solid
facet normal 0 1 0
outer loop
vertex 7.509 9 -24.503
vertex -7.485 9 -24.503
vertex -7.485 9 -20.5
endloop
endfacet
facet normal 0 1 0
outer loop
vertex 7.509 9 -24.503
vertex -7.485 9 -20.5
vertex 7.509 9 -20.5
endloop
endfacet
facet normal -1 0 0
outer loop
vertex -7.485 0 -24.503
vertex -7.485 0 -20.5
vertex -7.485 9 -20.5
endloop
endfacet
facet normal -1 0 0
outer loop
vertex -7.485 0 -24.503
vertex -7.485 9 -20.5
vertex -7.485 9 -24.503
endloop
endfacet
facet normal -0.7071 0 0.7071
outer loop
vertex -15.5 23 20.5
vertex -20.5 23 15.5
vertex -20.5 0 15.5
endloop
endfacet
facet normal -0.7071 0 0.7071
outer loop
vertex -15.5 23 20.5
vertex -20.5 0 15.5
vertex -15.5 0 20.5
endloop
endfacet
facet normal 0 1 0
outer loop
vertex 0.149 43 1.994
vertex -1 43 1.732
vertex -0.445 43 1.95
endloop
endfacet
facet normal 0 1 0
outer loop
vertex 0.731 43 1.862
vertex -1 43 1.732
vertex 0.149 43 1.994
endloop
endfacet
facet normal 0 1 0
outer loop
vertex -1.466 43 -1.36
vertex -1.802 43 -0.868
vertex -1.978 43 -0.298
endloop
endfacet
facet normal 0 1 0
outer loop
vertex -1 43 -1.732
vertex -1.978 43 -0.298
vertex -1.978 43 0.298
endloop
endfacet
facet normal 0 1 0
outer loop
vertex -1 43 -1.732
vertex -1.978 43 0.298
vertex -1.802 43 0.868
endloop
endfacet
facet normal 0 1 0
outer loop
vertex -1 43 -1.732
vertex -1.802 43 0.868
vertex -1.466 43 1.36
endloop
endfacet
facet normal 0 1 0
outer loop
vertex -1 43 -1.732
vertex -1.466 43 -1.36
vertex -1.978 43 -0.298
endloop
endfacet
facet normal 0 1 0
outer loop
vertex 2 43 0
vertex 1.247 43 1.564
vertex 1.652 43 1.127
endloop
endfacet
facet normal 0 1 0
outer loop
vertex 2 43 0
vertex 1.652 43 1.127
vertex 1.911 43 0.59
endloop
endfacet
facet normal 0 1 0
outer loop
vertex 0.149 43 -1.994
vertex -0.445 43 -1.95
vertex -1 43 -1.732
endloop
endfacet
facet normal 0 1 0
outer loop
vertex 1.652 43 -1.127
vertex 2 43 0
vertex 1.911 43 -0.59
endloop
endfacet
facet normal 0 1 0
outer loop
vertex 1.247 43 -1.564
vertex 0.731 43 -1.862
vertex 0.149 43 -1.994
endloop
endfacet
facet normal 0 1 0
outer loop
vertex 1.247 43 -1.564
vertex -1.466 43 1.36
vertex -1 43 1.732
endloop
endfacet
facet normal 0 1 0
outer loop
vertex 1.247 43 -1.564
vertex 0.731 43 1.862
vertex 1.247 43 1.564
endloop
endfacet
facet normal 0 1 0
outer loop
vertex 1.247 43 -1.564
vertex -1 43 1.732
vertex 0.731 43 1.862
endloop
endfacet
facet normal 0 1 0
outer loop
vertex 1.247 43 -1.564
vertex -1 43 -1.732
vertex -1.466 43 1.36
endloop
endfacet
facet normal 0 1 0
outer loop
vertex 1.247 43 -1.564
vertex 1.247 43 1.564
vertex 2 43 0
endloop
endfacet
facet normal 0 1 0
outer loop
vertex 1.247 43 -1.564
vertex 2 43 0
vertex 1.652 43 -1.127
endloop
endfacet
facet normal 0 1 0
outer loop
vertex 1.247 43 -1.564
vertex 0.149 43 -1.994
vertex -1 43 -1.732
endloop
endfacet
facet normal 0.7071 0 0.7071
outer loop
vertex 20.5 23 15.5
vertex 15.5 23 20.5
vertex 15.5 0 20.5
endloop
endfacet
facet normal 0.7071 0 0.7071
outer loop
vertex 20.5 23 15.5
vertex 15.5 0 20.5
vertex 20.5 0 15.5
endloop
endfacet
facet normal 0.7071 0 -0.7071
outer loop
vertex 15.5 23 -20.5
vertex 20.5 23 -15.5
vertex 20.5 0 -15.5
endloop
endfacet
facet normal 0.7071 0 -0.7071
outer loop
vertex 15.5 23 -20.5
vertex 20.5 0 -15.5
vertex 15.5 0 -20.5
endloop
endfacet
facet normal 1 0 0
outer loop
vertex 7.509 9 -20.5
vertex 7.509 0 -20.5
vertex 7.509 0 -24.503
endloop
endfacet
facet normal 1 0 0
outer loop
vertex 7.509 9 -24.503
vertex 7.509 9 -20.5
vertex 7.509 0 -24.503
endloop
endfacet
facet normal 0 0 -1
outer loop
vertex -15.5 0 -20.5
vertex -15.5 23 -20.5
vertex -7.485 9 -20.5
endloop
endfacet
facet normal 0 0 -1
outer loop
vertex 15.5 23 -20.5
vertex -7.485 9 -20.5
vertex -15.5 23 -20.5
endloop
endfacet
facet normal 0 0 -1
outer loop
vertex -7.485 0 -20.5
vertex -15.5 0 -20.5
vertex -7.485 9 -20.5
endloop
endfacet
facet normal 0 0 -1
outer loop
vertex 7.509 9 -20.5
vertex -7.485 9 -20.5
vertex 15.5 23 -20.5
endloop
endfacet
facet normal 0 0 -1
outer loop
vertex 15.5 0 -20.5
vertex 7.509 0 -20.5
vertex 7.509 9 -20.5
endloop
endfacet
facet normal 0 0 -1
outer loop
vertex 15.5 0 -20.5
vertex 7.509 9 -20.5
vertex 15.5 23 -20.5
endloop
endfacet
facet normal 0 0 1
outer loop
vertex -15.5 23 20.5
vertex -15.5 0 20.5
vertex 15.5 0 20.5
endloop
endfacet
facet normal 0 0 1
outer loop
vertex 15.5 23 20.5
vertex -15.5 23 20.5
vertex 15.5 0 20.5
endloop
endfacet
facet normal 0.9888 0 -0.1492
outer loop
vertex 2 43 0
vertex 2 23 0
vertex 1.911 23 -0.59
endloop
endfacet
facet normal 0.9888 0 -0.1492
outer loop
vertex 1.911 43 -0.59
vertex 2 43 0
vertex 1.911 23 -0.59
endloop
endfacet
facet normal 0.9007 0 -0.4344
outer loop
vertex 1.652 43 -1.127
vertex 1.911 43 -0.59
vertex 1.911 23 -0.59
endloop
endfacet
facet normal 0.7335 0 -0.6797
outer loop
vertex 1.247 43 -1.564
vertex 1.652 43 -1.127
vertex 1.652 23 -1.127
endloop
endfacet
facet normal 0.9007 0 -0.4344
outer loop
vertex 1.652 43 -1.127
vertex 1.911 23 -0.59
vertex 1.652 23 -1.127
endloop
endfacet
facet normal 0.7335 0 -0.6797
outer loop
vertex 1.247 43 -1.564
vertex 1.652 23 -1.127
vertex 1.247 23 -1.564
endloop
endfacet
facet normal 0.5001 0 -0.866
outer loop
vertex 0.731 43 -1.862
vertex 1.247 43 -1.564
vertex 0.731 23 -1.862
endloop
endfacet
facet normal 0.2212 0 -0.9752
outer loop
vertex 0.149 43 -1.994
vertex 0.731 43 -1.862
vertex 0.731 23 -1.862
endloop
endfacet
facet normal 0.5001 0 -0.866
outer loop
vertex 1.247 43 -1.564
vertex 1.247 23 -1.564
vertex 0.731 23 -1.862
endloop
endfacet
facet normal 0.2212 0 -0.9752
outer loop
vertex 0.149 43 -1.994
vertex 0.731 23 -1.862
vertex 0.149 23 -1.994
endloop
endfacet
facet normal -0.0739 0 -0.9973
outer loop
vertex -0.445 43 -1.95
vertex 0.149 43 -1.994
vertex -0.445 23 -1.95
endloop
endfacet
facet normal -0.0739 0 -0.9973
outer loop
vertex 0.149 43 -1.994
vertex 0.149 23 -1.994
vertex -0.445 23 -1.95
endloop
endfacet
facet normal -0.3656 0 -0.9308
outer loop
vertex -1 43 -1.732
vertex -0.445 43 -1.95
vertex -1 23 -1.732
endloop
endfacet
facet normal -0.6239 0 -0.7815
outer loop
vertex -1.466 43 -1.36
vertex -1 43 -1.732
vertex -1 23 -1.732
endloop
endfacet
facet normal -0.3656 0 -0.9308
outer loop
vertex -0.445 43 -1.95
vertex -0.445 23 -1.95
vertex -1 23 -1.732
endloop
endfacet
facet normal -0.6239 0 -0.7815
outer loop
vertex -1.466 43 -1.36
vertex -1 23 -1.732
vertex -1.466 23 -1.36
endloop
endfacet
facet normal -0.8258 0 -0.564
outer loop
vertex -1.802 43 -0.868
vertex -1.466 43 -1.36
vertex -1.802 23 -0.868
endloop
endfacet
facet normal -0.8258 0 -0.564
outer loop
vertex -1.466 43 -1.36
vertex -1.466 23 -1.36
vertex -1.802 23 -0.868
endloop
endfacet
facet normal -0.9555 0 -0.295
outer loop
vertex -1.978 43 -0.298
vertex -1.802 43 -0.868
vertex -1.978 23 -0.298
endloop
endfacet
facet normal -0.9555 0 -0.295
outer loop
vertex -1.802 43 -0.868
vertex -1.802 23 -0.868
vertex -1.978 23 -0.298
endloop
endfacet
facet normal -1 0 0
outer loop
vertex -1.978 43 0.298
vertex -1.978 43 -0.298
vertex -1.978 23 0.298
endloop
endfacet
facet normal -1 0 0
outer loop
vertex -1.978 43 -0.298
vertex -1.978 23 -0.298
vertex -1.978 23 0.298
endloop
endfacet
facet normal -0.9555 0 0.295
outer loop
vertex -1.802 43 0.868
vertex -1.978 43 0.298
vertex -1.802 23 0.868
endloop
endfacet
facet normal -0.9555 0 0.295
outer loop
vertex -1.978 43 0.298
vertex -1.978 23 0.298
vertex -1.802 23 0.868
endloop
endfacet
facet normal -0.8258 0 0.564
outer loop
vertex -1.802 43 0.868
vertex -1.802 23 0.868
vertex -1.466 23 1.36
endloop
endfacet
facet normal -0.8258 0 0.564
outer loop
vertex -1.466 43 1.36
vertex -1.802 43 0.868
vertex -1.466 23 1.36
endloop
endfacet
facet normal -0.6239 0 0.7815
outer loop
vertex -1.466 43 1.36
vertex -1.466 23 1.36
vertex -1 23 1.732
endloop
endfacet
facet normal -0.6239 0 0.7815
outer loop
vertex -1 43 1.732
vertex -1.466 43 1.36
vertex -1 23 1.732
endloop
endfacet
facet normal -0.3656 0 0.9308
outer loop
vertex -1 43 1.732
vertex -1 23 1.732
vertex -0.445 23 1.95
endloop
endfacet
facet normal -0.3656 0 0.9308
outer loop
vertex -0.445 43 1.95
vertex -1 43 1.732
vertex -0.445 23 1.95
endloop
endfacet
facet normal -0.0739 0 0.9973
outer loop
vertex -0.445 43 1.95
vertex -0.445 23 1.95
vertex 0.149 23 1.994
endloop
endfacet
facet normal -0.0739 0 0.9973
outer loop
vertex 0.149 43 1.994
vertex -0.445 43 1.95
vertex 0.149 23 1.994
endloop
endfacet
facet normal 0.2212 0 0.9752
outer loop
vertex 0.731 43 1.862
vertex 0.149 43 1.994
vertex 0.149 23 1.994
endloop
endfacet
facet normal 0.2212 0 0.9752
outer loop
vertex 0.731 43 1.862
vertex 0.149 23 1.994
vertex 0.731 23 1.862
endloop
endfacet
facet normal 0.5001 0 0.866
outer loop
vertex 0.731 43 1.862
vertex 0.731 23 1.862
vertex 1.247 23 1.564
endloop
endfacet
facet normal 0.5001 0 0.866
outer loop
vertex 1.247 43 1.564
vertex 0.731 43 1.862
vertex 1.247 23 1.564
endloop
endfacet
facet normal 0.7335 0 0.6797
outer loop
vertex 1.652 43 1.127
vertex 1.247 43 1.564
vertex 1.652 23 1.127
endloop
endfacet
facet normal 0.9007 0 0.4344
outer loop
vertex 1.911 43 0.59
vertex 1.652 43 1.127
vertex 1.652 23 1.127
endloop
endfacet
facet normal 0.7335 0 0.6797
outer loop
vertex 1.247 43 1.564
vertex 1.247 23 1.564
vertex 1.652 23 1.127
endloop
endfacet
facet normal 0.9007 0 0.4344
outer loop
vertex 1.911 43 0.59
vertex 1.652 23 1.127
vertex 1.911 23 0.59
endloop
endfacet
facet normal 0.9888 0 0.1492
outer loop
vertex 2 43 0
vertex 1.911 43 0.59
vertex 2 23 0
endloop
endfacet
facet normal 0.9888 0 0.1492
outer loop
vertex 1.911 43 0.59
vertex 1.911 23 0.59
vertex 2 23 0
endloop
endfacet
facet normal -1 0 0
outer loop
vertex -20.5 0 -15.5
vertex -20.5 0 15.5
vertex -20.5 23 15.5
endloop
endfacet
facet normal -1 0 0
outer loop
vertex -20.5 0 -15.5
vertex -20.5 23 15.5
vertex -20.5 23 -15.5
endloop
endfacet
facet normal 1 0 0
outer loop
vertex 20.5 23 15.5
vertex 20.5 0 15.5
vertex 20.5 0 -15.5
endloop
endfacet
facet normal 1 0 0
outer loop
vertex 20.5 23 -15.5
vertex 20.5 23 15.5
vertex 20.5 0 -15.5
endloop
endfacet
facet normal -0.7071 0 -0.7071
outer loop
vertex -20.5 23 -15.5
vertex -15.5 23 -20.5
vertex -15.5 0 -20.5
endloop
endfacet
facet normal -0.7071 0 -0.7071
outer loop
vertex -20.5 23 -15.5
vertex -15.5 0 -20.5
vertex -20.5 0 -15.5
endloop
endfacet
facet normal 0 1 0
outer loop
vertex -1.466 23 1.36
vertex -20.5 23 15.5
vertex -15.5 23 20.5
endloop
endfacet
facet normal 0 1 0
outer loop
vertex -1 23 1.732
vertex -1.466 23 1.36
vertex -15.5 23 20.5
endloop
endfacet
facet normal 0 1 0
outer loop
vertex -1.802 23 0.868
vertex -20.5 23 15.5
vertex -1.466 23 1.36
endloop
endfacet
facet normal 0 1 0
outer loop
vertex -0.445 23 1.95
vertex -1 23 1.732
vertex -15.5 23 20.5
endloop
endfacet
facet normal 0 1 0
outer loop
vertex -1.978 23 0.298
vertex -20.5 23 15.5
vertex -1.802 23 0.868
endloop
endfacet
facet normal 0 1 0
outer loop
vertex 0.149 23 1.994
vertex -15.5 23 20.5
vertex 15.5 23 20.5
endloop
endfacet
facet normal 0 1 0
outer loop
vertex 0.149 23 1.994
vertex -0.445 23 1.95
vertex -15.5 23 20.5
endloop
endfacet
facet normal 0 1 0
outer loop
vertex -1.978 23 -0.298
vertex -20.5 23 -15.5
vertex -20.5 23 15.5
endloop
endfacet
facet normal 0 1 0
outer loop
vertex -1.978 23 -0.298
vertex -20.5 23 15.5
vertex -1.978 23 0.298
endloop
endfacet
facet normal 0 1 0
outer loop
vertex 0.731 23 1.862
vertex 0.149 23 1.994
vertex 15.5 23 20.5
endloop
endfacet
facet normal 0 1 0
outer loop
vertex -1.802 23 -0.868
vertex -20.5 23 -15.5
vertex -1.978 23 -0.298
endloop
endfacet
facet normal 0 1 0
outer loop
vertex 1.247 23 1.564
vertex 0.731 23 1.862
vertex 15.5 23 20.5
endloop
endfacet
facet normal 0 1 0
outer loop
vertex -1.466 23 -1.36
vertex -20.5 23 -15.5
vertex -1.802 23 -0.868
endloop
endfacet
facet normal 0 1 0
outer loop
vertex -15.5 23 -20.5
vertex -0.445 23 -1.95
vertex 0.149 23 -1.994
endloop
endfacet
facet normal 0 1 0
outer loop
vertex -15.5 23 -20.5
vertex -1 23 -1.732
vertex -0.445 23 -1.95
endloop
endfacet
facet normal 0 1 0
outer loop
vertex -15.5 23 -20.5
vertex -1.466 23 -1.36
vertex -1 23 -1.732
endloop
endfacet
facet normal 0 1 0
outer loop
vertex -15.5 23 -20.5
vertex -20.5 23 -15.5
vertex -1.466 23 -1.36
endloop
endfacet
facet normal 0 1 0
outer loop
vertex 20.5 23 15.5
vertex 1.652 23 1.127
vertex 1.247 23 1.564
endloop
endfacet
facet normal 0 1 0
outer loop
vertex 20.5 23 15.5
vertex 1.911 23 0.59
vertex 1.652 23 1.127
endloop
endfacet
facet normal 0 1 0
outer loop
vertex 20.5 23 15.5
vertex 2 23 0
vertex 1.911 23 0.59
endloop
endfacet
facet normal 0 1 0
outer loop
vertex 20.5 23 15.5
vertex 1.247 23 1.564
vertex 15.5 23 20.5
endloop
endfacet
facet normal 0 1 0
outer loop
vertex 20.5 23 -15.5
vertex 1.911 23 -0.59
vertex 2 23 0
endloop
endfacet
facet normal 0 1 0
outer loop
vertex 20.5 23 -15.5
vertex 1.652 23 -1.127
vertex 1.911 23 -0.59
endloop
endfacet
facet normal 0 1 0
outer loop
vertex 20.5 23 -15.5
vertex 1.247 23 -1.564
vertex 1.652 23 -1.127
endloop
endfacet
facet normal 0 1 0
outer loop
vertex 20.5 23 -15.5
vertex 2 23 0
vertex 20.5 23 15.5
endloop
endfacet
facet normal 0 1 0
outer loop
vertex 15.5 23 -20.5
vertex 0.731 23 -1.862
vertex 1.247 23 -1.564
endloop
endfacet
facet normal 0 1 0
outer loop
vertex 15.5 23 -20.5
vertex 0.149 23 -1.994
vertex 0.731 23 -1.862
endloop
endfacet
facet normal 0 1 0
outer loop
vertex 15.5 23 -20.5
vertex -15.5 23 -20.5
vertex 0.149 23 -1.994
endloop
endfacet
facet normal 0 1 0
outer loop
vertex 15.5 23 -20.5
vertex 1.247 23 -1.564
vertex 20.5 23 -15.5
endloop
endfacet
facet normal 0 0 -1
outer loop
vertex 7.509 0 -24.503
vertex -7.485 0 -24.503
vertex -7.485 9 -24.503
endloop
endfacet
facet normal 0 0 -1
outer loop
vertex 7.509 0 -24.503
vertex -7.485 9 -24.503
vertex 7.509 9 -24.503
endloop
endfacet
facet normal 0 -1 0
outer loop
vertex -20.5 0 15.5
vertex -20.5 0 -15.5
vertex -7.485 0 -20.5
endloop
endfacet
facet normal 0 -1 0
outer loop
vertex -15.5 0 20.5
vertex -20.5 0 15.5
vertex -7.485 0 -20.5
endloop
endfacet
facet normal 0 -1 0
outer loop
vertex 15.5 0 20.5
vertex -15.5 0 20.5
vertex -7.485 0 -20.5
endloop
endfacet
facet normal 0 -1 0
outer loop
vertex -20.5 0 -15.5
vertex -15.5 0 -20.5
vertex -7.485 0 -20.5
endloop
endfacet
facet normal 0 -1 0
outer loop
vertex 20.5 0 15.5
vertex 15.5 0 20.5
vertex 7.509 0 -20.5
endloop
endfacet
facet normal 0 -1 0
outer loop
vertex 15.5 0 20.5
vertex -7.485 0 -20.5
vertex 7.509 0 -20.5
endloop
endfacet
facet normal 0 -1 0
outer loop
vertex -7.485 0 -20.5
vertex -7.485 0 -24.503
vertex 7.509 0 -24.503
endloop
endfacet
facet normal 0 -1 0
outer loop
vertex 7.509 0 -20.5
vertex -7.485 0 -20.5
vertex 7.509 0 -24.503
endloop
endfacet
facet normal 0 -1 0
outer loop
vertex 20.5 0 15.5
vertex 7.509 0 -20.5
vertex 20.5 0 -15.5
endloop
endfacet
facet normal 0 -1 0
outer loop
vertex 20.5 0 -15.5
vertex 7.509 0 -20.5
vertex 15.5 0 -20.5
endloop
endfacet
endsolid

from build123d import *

# Parameters (mm, degrees)
SKETCH2_W            = 41
SKETCH2_H            = 41
SKETCH2_W_2          = 14.993938253
SKETCH2_H_2          = 4.00275912
BOSS_EXTRUDE7_DEPTH  = 23
CUT_EXTRUDE1_DEPTH   = 23
CUT_EXTRUDE3_DEPTH   = 23
SKETCH8_W            = 14.993938253
SKETCH8_H            = 4.00275912
CUT_EXTRUDE4_DEPTH   = 14
SKETCH3_R            = 2
BOSS_EXTRUDE11_DEPTH = 20


with BuildPart() as part:
    # Sketch2 → Boss-Extrude7 (new body)
    with BuildSketch(Plane(origin=(0, 0, 0), x_dir=(1, 0, 0), z_dir=(0, 1, 0))):
        Rectangle(SKETCH2_W, SKETCH2_H)
        with Locations((0.012281963, 22.50137956)):
            Rectangle(SKETCH2_W_2, SKETCH2_H_2)
    extrude(amount=BOSS_EXTRUDE7_DEPTH)

    # Sketch6 → Cut-Extrude1 (cut)
    with BuildSketch(Plane(origin=(0, 0, 0), x_dir=(1, 0, 0), z_dir=(0, 1, 0))):
        Polygon((-20.5, 20.5), (-15.5, 20.5), (-20.5, 15.5), align=None)
    extrude(amount=CUT_EXTRUDE1_DEPTH, mode=Mode.SUBTRACT)

    # Sketch7 → Cut-Extrude3 (cut)
    with BuildSketch(Plane(origin=(0, 0, 0), x_dir=(1, 0, 0), z_dir=(0, 1, 0))):
        Polygon((-20.5, -20.5), (-20.5, -15.5), (-15.5, -20.5), align=None)
        Polygon((20.5, -20.5), (15.5, -20.5), (20.5, -15.5), align=None)
        Polygon((20.5, 20.5), (20.5, 15.5), (15.5, 20.5), align=None)
    extrude(amount=CUT_EXTRUDE3_DEPTH, mode=Mode.SUBTRACT)

    # Sketch8 → Cut-Extrude4 (cut)
    with BuildSketch(Plane(origin=(0, 23, 0), x_dir=(1, 0, 0), z_dir=(0, 1, 0))):
        with Locations((0.012281963, 22.50137956)):
            Rectangle(SKETCH8_W, SKETCH8_H)
    extrude(amount=-CUT_EXTRUDE4_DEPTH, mode=Mode.SUBTRACT)

    # Sketch3 → Boss-Extrude11 (add)
    with BuildSketch(Plane(origin=(0, 23, 0), x_dir=(1, 0, 0), z_dir=(0, 1, 0))):
        Circle(SKETCH3_R)
    extrude(amount=BOSS_EXTRUDE11_DEPTH)


solid = part.part
